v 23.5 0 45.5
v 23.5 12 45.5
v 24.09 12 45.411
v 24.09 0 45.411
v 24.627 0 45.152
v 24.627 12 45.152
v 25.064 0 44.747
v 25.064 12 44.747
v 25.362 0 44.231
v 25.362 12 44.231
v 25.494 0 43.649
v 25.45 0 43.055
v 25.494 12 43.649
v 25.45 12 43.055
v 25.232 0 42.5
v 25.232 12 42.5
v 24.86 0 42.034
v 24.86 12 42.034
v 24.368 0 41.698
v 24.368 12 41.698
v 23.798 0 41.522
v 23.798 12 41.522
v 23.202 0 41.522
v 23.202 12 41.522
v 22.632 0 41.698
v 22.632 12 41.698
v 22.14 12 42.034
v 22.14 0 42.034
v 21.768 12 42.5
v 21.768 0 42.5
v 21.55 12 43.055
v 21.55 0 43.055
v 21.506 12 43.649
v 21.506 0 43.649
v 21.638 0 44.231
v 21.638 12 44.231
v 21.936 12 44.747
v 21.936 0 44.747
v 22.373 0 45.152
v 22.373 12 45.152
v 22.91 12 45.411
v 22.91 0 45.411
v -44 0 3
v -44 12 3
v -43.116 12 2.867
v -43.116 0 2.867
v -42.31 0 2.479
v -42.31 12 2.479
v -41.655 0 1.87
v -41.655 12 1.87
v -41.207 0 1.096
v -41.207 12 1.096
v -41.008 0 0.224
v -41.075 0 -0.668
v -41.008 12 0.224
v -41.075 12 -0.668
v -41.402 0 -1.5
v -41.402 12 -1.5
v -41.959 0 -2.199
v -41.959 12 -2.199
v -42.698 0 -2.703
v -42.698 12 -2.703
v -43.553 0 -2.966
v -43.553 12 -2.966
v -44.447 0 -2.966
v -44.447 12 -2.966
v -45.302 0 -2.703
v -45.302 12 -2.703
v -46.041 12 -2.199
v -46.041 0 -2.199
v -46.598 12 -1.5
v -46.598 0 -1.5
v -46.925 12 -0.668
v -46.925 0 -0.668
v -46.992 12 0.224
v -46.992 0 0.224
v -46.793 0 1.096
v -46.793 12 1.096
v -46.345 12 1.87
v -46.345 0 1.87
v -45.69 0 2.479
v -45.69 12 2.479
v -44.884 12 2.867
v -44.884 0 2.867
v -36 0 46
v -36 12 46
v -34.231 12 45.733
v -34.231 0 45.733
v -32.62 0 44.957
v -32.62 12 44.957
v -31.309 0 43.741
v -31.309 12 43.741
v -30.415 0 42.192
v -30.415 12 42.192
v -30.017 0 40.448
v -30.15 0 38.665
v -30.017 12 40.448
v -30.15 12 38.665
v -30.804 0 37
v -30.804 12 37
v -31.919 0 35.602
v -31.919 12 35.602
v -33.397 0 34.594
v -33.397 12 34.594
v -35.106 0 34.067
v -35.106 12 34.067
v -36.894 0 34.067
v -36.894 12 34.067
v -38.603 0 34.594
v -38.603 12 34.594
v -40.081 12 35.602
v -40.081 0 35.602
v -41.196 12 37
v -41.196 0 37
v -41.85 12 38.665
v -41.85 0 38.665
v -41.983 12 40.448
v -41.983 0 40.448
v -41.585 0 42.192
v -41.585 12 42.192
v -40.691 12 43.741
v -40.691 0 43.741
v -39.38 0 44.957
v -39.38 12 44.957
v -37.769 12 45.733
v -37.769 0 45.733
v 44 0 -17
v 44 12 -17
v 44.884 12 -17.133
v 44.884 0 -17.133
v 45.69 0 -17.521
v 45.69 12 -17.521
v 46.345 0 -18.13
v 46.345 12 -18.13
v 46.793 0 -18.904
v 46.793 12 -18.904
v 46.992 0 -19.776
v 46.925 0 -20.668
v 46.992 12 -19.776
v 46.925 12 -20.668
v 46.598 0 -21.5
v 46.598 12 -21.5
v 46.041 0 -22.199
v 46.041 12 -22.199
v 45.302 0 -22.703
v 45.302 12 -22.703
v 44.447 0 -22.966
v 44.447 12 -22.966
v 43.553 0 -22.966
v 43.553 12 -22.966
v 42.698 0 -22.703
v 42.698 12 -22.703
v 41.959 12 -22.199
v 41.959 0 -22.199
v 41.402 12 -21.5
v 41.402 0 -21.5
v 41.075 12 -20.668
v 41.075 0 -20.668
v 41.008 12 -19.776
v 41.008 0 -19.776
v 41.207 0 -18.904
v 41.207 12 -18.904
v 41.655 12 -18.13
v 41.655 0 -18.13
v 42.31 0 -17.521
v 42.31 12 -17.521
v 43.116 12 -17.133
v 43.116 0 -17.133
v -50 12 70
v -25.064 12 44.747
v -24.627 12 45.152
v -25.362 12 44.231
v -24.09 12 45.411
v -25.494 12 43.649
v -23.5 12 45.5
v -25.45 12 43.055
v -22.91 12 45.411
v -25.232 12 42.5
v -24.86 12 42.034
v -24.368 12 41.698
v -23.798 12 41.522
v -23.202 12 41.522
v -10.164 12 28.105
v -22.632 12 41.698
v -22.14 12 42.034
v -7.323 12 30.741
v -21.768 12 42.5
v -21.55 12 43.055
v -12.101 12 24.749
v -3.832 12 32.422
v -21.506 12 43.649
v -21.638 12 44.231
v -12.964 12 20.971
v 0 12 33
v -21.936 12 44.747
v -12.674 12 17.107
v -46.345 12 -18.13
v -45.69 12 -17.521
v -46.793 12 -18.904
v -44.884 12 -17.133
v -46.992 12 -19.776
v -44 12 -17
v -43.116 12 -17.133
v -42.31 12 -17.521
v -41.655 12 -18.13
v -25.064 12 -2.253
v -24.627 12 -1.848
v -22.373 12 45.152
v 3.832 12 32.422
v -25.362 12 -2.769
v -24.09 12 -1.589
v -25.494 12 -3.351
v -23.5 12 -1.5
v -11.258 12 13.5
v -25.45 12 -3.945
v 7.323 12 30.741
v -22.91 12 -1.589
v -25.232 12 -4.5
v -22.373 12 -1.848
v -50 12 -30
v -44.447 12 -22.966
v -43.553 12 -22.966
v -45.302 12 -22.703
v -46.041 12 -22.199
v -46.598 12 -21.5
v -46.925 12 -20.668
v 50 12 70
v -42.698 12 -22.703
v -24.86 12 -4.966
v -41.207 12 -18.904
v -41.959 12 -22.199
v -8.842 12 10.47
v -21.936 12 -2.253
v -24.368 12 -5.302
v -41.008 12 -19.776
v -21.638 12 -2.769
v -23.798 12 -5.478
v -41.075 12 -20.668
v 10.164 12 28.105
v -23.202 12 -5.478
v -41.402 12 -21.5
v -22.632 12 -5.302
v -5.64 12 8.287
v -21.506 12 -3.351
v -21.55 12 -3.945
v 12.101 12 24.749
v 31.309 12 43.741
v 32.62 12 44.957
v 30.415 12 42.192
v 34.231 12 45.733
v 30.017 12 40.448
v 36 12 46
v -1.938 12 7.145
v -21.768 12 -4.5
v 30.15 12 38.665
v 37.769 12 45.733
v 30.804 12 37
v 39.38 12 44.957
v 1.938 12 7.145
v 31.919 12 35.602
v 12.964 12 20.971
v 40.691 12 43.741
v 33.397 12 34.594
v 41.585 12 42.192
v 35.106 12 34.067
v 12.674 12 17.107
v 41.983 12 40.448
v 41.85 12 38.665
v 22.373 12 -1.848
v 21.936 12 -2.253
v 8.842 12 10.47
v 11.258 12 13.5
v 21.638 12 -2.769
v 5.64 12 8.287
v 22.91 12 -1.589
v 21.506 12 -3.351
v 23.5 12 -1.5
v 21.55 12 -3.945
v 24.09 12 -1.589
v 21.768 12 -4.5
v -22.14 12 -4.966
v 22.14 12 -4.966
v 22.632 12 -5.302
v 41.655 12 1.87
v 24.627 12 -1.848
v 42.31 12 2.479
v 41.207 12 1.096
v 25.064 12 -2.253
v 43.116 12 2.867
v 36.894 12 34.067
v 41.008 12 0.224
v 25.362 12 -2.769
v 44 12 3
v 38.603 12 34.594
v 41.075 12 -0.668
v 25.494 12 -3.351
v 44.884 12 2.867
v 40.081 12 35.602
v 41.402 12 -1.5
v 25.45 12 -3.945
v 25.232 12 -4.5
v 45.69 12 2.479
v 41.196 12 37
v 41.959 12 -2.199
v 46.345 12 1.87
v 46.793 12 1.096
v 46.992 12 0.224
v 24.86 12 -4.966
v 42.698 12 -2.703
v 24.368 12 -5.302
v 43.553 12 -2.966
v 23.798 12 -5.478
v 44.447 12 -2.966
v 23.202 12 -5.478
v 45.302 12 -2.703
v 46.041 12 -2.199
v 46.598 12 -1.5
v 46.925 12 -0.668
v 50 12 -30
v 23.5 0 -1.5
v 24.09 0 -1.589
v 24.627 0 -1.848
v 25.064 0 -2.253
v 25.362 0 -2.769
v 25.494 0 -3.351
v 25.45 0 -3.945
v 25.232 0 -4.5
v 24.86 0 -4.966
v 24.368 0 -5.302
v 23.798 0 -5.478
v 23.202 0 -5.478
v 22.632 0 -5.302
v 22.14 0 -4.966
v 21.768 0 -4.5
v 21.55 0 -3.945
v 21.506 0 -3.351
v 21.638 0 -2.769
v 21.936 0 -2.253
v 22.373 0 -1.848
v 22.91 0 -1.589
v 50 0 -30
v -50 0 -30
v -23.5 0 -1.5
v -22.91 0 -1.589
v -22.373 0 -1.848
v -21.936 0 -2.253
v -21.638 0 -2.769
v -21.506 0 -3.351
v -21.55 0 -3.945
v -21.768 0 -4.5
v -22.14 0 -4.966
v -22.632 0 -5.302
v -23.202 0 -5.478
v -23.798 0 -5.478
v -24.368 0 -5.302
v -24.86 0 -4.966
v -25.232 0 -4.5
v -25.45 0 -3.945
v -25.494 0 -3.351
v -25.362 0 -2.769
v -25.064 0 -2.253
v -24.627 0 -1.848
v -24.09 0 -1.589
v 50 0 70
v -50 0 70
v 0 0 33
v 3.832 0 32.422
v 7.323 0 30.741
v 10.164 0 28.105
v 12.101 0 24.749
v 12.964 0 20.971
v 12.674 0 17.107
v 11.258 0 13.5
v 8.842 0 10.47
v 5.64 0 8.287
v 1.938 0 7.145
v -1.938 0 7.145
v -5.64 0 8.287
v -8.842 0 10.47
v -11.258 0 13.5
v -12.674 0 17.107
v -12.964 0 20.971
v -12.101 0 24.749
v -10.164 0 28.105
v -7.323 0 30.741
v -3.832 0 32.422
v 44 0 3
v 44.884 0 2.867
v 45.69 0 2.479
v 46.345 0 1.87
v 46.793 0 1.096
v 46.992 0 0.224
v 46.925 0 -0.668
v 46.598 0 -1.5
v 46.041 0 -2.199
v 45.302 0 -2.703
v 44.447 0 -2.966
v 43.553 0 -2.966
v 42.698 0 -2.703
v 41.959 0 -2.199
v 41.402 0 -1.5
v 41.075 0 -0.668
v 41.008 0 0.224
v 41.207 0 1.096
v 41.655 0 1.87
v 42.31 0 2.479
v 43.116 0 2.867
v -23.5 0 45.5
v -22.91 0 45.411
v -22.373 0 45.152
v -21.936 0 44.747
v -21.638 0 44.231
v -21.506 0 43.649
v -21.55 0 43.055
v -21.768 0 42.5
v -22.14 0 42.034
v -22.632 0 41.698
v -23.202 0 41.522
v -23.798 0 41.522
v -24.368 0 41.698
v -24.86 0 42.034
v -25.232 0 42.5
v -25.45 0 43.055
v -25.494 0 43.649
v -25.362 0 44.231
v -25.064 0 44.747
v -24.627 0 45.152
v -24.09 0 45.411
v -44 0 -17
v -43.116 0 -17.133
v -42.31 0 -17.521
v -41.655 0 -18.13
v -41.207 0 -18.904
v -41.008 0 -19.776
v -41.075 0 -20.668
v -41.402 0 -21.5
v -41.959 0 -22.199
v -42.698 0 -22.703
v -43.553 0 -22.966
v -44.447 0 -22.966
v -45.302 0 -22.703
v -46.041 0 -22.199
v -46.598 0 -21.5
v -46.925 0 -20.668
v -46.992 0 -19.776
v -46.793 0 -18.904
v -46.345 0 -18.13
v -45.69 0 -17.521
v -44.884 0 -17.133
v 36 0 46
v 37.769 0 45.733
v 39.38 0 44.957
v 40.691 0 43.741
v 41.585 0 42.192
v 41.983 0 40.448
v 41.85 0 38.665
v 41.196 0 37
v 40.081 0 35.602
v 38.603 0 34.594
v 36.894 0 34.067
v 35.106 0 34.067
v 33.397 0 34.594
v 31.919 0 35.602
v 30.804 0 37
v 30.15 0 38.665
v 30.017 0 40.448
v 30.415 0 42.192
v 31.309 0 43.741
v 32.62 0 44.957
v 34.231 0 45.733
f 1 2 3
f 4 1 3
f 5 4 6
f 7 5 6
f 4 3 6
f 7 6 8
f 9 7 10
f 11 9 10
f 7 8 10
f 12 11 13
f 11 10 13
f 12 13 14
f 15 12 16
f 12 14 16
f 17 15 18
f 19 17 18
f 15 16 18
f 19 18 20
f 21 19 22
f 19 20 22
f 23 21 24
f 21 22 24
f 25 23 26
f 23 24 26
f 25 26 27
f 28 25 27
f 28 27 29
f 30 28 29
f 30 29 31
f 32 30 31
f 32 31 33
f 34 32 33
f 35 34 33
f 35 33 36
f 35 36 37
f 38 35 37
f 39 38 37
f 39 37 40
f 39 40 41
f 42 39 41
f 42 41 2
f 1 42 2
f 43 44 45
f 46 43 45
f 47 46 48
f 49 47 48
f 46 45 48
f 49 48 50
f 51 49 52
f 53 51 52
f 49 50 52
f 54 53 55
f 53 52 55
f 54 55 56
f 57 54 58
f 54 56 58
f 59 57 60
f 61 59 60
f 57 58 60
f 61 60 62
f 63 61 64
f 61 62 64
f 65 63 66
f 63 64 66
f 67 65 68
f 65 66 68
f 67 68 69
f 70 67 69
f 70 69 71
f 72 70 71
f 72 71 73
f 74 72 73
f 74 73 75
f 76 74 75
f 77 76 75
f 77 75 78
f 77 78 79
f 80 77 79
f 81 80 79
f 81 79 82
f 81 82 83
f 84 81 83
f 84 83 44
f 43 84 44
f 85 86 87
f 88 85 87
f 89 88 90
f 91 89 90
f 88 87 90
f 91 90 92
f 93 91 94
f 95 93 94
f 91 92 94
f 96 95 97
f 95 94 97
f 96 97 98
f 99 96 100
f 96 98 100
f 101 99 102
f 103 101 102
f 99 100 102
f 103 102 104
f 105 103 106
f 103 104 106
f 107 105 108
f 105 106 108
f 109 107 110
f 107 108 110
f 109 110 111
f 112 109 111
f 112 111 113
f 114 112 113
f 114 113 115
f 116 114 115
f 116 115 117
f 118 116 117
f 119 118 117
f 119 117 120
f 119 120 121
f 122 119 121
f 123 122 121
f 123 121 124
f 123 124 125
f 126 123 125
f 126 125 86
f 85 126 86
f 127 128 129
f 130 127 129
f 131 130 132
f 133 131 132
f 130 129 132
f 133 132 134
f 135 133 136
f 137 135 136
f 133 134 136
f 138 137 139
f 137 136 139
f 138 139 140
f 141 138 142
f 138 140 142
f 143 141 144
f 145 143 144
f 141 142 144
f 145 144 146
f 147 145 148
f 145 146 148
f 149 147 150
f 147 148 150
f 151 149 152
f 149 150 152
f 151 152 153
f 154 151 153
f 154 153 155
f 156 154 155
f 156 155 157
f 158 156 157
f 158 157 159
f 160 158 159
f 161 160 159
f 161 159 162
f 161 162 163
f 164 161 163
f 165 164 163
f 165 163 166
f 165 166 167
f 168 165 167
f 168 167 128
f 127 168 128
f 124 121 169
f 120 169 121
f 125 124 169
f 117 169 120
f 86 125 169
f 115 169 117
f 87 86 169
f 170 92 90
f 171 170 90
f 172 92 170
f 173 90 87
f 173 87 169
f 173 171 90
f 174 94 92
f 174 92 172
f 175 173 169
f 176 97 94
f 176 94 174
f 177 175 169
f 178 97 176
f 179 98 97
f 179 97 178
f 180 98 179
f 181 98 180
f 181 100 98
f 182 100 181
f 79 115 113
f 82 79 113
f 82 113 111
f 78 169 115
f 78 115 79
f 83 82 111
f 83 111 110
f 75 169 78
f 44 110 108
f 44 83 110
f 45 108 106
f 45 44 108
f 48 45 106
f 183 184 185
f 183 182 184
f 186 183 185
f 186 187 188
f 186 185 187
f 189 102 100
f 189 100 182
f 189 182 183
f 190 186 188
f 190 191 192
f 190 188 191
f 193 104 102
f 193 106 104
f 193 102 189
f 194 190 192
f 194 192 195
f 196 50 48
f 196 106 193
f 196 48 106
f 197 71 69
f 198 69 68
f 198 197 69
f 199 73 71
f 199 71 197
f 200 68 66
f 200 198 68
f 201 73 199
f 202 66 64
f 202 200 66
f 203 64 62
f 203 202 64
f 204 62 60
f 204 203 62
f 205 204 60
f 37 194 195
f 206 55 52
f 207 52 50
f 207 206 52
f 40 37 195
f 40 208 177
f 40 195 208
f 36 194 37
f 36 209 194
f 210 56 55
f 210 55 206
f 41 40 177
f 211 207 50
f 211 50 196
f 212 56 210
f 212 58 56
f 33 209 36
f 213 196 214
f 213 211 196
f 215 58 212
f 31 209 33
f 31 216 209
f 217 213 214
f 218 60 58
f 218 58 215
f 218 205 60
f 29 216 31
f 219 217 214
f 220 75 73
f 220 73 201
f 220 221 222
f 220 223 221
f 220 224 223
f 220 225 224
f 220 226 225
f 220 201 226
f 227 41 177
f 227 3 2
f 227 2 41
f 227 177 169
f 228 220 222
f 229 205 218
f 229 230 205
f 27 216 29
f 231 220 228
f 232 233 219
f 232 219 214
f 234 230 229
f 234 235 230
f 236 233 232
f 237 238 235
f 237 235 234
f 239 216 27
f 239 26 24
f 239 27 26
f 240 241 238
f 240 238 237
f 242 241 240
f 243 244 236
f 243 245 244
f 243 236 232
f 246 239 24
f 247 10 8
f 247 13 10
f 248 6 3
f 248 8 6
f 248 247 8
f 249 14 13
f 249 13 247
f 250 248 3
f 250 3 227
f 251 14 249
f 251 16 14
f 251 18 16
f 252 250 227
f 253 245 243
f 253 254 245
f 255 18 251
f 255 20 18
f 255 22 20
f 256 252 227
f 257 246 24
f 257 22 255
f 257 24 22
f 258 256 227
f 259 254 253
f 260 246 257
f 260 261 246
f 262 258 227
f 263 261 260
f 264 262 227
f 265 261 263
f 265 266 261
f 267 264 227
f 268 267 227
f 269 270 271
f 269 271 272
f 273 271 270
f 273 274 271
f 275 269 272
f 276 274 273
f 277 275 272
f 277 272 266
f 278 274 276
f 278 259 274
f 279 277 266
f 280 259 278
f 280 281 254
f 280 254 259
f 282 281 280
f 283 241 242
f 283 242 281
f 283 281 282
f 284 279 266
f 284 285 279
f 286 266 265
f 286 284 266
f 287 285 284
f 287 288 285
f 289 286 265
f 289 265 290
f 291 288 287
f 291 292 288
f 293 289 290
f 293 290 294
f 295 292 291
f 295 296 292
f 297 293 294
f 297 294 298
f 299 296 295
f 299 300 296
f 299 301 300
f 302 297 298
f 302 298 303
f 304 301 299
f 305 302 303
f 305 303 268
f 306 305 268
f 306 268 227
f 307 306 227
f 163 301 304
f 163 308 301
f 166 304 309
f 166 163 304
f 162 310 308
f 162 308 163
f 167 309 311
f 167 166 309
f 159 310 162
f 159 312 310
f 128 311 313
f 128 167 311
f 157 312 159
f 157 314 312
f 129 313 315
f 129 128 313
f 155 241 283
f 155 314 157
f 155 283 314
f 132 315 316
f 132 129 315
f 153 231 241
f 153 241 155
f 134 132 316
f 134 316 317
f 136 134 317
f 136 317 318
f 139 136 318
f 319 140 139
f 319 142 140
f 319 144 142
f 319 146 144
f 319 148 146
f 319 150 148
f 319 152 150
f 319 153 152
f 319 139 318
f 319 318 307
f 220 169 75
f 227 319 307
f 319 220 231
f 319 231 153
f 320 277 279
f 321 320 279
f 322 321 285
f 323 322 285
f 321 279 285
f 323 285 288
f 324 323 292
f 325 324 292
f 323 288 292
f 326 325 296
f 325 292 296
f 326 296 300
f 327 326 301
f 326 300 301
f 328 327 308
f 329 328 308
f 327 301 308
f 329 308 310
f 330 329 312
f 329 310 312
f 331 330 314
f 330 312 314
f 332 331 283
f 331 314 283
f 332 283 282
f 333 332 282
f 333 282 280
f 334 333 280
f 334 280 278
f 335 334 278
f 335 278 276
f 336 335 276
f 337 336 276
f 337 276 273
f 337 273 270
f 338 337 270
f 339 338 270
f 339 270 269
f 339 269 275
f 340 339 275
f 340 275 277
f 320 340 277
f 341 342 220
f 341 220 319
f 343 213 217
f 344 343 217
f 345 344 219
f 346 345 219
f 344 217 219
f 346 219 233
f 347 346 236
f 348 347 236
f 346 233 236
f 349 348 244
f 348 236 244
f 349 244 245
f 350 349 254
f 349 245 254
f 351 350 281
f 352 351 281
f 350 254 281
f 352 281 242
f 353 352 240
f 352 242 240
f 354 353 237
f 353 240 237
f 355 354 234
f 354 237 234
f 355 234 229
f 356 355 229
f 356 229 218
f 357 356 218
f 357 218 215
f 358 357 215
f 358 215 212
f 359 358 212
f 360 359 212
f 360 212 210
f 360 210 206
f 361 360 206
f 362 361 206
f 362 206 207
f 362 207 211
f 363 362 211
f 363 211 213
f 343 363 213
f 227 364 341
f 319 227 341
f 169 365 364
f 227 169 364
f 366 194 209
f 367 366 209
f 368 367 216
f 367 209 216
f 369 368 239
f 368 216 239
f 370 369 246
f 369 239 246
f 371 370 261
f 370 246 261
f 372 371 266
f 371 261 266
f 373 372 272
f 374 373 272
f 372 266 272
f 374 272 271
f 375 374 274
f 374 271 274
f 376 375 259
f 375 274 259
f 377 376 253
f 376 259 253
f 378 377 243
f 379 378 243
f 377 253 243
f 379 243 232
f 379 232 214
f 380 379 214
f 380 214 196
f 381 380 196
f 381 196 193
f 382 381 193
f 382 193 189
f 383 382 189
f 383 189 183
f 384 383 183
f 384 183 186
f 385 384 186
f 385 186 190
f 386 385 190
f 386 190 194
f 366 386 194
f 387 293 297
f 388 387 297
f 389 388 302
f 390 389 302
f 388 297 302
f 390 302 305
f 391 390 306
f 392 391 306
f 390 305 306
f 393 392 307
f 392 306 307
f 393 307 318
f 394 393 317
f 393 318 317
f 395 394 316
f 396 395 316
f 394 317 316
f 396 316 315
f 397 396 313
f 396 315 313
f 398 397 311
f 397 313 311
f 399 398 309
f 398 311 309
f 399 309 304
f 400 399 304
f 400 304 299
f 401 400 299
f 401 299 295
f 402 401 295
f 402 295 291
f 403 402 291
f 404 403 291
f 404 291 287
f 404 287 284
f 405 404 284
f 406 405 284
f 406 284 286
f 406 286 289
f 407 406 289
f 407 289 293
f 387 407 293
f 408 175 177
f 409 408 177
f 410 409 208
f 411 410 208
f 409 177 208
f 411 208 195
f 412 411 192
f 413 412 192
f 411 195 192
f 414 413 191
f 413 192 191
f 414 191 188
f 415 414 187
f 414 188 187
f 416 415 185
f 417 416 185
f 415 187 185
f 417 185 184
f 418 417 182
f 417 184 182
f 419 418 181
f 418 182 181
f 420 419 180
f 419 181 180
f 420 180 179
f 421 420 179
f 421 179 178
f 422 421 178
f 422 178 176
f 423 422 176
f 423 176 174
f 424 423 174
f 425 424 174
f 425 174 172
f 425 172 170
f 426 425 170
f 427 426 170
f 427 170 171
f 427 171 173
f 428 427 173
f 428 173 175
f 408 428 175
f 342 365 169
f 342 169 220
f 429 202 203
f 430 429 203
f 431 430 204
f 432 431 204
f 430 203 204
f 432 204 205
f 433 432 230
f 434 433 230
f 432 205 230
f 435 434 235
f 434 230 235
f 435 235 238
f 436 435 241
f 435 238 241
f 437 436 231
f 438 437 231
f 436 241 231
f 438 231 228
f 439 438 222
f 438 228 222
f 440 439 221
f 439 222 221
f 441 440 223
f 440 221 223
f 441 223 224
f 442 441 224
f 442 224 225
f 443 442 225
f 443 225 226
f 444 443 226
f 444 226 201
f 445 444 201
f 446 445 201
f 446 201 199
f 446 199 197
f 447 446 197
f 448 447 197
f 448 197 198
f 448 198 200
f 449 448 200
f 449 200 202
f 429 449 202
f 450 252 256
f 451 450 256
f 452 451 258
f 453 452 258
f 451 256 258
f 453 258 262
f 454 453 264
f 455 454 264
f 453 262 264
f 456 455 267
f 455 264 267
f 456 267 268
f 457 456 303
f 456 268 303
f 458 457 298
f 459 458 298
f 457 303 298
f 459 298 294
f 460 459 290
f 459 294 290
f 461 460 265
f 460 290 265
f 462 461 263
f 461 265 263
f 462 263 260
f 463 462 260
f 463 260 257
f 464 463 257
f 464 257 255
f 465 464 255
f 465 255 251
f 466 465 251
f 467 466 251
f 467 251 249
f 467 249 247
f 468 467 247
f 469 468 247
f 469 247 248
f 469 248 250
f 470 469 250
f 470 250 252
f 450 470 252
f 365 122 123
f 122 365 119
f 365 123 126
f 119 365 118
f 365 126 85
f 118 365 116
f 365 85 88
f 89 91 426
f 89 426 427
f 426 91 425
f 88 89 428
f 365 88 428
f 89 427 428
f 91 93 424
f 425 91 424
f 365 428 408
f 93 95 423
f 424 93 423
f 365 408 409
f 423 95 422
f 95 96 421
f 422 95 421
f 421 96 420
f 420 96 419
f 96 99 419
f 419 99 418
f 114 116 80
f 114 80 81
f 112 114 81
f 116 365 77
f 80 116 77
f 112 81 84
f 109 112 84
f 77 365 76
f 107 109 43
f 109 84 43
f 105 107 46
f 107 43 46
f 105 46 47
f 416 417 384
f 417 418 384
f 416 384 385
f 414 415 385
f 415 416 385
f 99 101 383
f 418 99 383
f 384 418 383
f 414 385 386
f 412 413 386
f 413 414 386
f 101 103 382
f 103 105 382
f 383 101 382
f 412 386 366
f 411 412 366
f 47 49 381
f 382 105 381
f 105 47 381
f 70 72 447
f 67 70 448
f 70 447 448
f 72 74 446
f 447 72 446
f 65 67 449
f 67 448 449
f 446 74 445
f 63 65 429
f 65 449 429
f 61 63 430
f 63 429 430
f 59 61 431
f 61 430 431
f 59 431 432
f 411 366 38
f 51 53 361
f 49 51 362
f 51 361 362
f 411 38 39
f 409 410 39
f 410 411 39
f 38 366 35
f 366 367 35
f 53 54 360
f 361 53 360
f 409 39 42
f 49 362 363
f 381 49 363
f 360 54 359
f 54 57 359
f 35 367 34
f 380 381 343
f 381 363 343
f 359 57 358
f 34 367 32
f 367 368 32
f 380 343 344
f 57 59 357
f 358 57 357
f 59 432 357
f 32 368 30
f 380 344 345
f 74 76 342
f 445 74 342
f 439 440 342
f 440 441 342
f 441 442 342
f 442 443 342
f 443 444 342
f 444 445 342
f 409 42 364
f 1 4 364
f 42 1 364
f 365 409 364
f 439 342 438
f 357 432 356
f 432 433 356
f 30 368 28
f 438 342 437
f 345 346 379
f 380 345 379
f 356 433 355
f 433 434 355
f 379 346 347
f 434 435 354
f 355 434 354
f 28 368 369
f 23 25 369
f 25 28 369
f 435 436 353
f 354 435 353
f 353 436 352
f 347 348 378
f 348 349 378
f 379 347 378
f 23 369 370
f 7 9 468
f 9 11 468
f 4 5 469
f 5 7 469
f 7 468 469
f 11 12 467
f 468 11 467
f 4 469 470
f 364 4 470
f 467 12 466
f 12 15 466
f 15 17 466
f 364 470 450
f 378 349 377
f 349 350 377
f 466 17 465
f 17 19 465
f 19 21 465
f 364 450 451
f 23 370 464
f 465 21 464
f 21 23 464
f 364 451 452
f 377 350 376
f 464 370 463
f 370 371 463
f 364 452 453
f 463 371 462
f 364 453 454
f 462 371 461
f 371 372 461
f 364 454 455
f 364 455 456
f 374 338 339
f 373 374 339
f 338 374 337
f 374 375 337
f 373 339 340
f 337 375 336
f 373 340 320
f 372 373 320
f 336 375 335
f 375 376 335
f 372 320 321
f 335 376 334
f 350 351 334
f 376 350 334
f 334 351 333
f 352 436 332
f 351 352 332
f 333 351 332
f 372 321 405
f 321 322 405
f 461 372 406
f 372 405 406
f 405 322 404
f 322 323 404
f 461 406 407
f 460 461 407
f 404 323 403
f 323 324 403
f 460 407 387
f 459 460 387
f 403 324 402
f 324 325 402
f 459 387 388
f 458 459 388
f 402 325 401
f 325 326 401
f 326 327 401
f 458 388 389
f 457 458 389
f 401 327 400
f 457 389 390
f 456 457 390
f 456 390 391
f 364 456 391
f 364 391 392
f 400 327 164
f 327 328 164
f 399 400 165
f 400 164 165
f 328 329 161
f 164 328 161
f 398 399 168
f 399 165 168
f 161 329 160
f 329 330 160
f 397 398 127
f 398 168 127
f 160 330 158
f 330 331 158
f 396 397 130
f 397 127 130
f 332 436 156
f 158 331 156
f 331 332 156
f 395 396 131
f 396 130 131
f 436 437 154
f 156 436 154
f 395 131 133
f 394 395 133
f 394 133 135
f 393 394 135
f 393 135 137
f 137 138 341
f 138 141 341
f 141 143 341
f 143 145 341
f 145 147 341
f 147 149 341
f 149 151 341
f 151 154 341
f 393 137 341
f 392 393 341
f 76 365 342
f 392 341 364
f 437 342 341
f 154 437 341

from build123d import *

# Parameters (mm, degrees)
SKETCH1_W           = 100
SKETCH1_H           = 100
BOSS_EXTRUDE1_DEPTH = 12
CUT_EXTRUDE1_REACH  = 88.856
SKETCH2_R           = 3
CUT_EXTRUDE2_REACH  = 88.856
SKETCH3_R           = 2
SKETCH3_R_2         = 13
CUT_EXTRUDE3_REACH  = 88.856
SKETCH4_R           = 6


with BuildPart() as part:
    # Sketch1 → Boss-Extrude1 (new body)
    with BuildSketch(Plane(origin=(0, 0, 0), x_dir=(1, 0, 0), z_dir=(0, 1, 0))):
        with Locations((0, -20)):
            Rectangle(SKETCH1_W, SKETCH1_H)
    extrude(amount=BOSS_EXTRUDE1_DEPTH)

    # Sketch2 → Cut-Extrude1 (cut, up to next)
    with BuildSketch(Plane(origin=(0, 12, 0), x_dir=(1, 0, 0), z_dir=(0, 1, 0)), mode=Mode.PRIVATE) as cut_extrude1_sk1:
        with Locations(Location((-44, 20, 0), (0, 0, 270))):
            Circle(SKETCH2_R)
    cut_extrude1_tool1 = extrude(cut_extrude1_sk1.sketch, amount=-CUT_EXTRUDE1_REACH, mode=Mode.PRIVATE) & part.part
    # Sketch2 → Cut-Extrude1 (cut, up to next)
    with BuildSketch(Plane(origin=(0, 12, 0), x_dir=(1, 0, 0), z_dir=(0, 1, 0)), mode=Mode.PRIVATE) as cut_extrude1_sk2:
        with Locations(Location((-44, 0, 0), (0, 0, 270))):
            Circle(SKETCH2_R)
    cut_extrude1_tool2 = extrude(cut_extrude1_sk2.sketch, amount=-CUT_EXTRUDE1_REACH, mode=Mode.PRIVATE) & part.part
    # Sketch2 → Cut-Extrude1 (cut, up to next)
    with BuildSketch(Plane(origin=(0, 12, 0), x_dir=(1, 0, 0), z_dir=(0, 1, 0)), mode=Mode.PRIVATE) as cut_extrude1_sk3:
        with Locations(Location((44, 20, 0), (0, 0, 270))):
            Circle(SKETCH2_R)
    cut_extrude1_tool3 = extrude(cut_extrude1_sk3.sketch, amount=-CUT_EXTRUDE1_REACH, mode=Mode.PRIVATE) & part.part
    # Sketch2 → Cut-Extrude1 (cut, up to next)
    with BuildSketch(Plane(origin=(0, 12, 0), x_dir=(1, 0, 0), z_dir=(0, 1, 0)), mode=Mode.PRIVATE) as cut_extrude1_sk4:
        with Locations(Location((44, 0, 0), (0, 0, 270))):
            Circle(SKETCH2_R)
    cut_extrude1_tool4 = extrude(cut_extrude1_sk4.sketch, amount=-CUT_EXTRUDE1_REACH, mode=Mode.PRIVATE) & part.part
    add(cut_extrude1_tool1.solids().sort_by_distance((-44, 12, -20))[0], mode=Mode.SUBTRACT)
    add(cut_extrude1_tool2.solids().sort_by_distance((-44, 12, 0))[0], mode=Mode.SUBTRACT)
    add(cut_extrude1_tool3.solids().sort_by_distance((44, 12, -20))[0], mode=Mode.SUBTRACT)
    add(cut_extrude1_tool4.solids().sort_by_distance((44, 12, 0))[0], mode=Mode.SUBTRACT)

    # Sketch3 → Cut-Extrude2 (cut, up to next)
    with BuildSketch(Plane(origin=(0, 12, 0), x_dir=(1, 0, 0), z_dir=(0, 1, 0)), mode=Mode.PRIVATE) as cut_extrude2_sk1:
        with Locations(Location((-23.5, -43.5, 0), (0, 0, 270))):
            Circle(SKETCH3_R)
    cut_extrude2_tool1 = extrude(cut_extrude2_sk1.sketch, amount=-CUT_EXTRUDE2_REACH, mode=Mode.PRIVATE) & part.part
    # Sketch3 → Cut-Extrude2 (cut, up to next)
    with BuildSketch(Plane(origin=(0, 12, 0), x_dir=(1, 0, 0), z_dir=(0, 1, 0)), mode=Mode.PRIVATE) as cut_extrude2_sk2:
        with Locations(Location((23.5, -43.5, 0), (0, 0, 270))):
            Circle(SKETCH3_R)
    cut_extrude2_tool2 = extrude(cut_extrude2_sk2.sketch, amount=-CUT_EXTRUDE2_REACH, mode=Mode.PRIVATE) & part.part
    # Sketch3 → Cut-Extrude2 (cut, up to next)
    with BuildSketch(Plane(origin=(0, 12, 0), x_dir=(1, 0, 0), z_dir=(0, 1, 0)), mode=Mode.PRIVATE) as cut_extrude2_sk3:
        with Locations(Location((23.5, 3.5, 0), (0, 0, 270))):
            Circle(SKETCH3_R)
    cut_extrude2_tool3 = extrude(cut_extrude2_sk3.sketch, amount=-CUT_EXTRUDE2_REACH, mode=Mode.PRIVATE) & part.part
    # Sketch3 → Cut-Extrude2 (cut, up to next)
    with BuildSketch(Plane(origin=(0, 12, 0), x_dir=(1, 0, 0), z_dir=(0, 1, 0)), mode=Mode.PRIVATE) as cut_extrude2_sk4:
        with Locations(Location((-23.5, 3.5, 0), (0, 0, 270))):
            Circle(SKETCH3_R)
    cut_extrude2_tool4 = extrude(cut_extrude2_sk4.sketch, amount=-CUT_EXTRUDE2_REACH, mode=Mode.PRIVATE) & part.part
    # Sketch3 → Cut-Extrude2 (cut, up to next)
    with BuildSketch(Plane(origin=(0, 12, 0), x_dir=(1, 0, 0), z_dir=(0, 1, 0)), mode=Mode.PRIVATE) as cut_extrude2_sk5:
        with Locations(Location((0, -20, 0), (0, 0, 270))):
            Circle(SKETCH3_R_2)
    cut_extrude2_tool5 = extrude(cut_extrude2_sk5.sketch, amount=-CUT_EXTRUDE2_REACH, mode=Mode.PRIVATE) & part.part
    add(cut_extrude2_tool1.solids().sort_by_distance((-23.5, 12, 43.5))[0], mode=Mode.SUBTRACT)
    add(cut_extrude2_tool2.solids().sort_by_distance((23.5, 12, 43.5))[0], mode=Mode.SUBTRACT)
    add(cut_extrude2_tool3.solids().sort_by_distance((23.5, 12, -3.5))[0], mode=Mode.SUBTRACT)
    add(cut_extrude2_tool4.solids().sort_by_distance((-23.5, 12, -3.5))[0], mode=Mode.SUBTRACT)
    add(cut_extrude2_tool5.solids().sort_by_distance((0, 12, 20))[0], mode=Mode.SUBTRACT)

    # Sketch4 → Cut-Extrude3 (cut, up to next)
    with BuildSketch(Plane(origin=(0, 12, 0), x_dir=(1, 0, 0), z_dir=(0, 1, 0)), mode=Mode.PRIVATE) as cut_extrude3_sk1:
        with Locations(Location((-36, -40, 0), (0, 0, 270))):
            Circle(SKETCH4_R)
    cut_extrude3_tool1 = extrude(cut_extrude3_sk1.sketch, amount=-CUT_EXTRUDE3_REACH, mode=Mode.PRIVATE) & part.part
    # Sketch4 → Cut-Extrude3 (cut, up to next)
    with BuildSketch(Plane(origin=(0, 12, 0), x_dir=(1, 0, 0), z_dir=(0, 1, 0)), mode=Mode.PRIVATE) as cut_extrude3_sk2:
        with Locations(Location((36, -40, 0), (0, 0, 270))):
            Circle(SKETCH4_R)
    cut_extrude3_tool2 = extrude(cut_extrude3_sk2.sketch, amount=-CUT_EXTRUDE3_REACH, mode=Mode.PRIVATE) & part.part
    add(cut_extrude3_tool1.solids().sort_by_distance((-36, 12, 40))[0], mode=Mode.SUBTRACT)
    add(cut_extrude3_tool2.solids().sort_by_distance((36, 12, 40))[0], mode=Mode.SUBTRACT)


solid = part.part
